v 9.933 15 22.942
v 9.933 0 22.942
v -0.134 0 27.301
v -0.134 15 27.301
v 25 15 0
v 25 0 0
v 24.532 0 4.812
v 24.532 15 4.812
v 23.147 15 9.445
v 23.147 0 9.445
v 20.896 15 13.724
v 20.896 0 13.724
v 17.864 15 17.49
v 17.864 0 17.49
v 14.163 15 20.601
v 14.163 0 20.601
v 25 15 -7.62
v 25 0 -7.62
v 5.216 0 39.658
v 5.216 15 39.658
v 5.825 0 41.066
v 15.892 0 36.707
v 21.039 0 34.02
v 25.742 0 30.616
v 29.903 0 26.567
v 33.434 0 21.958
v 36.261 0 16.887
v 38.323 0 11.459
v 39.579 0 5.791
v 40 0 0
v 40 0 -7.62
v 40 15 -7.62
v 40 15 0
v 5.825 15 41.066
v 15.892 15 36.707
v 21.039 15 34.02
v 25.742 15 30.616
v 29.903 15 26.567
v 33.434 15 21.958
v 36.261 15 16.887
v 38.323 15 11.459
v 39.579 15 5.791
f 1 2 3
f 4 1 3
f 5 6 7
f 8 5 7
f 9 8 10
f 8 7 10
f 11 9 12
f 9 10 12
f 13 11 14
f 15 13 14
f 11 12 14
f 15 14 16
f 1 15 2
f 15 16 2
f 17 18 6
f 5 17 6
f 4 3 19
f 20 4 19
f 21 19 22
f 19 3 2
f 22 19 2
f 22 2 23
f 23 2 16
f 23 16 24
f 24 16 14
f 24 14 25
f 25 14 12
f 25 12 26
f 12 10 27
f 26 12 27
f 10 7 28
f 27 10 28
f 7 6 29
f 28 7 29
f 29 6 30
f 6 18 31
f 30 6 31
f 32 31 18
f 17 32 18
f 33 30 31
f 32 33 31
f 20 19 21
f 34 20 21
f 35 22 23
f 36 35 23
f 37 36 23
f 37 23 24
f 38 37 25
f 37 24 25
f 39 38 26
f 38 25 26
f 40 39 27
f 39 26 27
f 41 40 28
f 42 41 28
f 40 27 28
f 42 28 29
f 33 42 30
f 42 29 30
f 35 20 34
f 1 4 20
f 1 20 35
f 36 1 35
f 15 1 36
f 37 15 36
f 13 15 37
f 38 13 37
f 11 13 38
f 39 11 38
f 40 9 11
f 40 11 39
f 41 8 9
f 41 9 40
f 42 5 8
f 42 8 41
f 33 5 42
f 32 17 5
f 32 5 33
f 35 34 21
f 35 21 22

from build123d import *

# Parameters (mm, degrees)
BOSS_EXTRUDE1_DEPTH = 15


with BuildPart() as part:
    # Sketch1 → Boss-Extrude1 (new body)
    with BuildSketch(Plane(origin=(0, 0, 0), x_dir=(1, 0, 0), z_dir=(0, 1, 0))):
        with BuildLine():
            Line((15.892322519, -36.707411853), (9.932701575, -22.942132408))
            Line((9.932701575, -22.942132408), (-0.134306126, -27.300601859))
            Line((-0.134306126, -27.300601859), (5.215978235, -39.658461532))
            ThreePointArc((5.215978235, -39.658461532), (10.656794252, -38.554282982), (15.892322519, -36.707411853))
        make_face()
        with BuildLine():
            Line((40, 0), (25, 0))
            ThreePointArc((25, 0), (20.896381737, -13.723746949), (9.932701575, -22.942132408))
            Line((9.932701575, -22.942132408), (15.892322519, -36.707411853))
            ThreePointArc((15.892322519, -36.707411853), (33.434210779, -21.957995118), (40, 0))
        make_face()
        with BuildLine():
            Line((25, 7.62), (25, 0))
            Line((25, 0), (40, 0))
            ThreePointArc((40, 0), (39.816450827, 3.827563654), (39.267487824, 7.62))
            Line((39.267487824, 7.62), (25, 7.62))
        make_face()
        with BuildLine():
            Line((5.825314819, -41.065881304), (15.892322519, -36.707411853))
            ThreePointArc((15.892322519, -36.707411853), (10.656794252, -38.554282982), (5.215978235, -39.658461532))
            Line((5.215978235, -39.658461532), (5.825314819, -41.065881304))
        make_face()
        with BuildLine():
            ThreePointArc((39.267487824, 7.62), (39.816450827, 3.827563654), (40, 0))
            Line((40, 0), (40, 7.62))
            Line((40, 7.62), (39.267487824, 7.62))
        make_face()
    extrude(amount=BOSS_EXTRUDE1_DEPTH)


solid = part.part
